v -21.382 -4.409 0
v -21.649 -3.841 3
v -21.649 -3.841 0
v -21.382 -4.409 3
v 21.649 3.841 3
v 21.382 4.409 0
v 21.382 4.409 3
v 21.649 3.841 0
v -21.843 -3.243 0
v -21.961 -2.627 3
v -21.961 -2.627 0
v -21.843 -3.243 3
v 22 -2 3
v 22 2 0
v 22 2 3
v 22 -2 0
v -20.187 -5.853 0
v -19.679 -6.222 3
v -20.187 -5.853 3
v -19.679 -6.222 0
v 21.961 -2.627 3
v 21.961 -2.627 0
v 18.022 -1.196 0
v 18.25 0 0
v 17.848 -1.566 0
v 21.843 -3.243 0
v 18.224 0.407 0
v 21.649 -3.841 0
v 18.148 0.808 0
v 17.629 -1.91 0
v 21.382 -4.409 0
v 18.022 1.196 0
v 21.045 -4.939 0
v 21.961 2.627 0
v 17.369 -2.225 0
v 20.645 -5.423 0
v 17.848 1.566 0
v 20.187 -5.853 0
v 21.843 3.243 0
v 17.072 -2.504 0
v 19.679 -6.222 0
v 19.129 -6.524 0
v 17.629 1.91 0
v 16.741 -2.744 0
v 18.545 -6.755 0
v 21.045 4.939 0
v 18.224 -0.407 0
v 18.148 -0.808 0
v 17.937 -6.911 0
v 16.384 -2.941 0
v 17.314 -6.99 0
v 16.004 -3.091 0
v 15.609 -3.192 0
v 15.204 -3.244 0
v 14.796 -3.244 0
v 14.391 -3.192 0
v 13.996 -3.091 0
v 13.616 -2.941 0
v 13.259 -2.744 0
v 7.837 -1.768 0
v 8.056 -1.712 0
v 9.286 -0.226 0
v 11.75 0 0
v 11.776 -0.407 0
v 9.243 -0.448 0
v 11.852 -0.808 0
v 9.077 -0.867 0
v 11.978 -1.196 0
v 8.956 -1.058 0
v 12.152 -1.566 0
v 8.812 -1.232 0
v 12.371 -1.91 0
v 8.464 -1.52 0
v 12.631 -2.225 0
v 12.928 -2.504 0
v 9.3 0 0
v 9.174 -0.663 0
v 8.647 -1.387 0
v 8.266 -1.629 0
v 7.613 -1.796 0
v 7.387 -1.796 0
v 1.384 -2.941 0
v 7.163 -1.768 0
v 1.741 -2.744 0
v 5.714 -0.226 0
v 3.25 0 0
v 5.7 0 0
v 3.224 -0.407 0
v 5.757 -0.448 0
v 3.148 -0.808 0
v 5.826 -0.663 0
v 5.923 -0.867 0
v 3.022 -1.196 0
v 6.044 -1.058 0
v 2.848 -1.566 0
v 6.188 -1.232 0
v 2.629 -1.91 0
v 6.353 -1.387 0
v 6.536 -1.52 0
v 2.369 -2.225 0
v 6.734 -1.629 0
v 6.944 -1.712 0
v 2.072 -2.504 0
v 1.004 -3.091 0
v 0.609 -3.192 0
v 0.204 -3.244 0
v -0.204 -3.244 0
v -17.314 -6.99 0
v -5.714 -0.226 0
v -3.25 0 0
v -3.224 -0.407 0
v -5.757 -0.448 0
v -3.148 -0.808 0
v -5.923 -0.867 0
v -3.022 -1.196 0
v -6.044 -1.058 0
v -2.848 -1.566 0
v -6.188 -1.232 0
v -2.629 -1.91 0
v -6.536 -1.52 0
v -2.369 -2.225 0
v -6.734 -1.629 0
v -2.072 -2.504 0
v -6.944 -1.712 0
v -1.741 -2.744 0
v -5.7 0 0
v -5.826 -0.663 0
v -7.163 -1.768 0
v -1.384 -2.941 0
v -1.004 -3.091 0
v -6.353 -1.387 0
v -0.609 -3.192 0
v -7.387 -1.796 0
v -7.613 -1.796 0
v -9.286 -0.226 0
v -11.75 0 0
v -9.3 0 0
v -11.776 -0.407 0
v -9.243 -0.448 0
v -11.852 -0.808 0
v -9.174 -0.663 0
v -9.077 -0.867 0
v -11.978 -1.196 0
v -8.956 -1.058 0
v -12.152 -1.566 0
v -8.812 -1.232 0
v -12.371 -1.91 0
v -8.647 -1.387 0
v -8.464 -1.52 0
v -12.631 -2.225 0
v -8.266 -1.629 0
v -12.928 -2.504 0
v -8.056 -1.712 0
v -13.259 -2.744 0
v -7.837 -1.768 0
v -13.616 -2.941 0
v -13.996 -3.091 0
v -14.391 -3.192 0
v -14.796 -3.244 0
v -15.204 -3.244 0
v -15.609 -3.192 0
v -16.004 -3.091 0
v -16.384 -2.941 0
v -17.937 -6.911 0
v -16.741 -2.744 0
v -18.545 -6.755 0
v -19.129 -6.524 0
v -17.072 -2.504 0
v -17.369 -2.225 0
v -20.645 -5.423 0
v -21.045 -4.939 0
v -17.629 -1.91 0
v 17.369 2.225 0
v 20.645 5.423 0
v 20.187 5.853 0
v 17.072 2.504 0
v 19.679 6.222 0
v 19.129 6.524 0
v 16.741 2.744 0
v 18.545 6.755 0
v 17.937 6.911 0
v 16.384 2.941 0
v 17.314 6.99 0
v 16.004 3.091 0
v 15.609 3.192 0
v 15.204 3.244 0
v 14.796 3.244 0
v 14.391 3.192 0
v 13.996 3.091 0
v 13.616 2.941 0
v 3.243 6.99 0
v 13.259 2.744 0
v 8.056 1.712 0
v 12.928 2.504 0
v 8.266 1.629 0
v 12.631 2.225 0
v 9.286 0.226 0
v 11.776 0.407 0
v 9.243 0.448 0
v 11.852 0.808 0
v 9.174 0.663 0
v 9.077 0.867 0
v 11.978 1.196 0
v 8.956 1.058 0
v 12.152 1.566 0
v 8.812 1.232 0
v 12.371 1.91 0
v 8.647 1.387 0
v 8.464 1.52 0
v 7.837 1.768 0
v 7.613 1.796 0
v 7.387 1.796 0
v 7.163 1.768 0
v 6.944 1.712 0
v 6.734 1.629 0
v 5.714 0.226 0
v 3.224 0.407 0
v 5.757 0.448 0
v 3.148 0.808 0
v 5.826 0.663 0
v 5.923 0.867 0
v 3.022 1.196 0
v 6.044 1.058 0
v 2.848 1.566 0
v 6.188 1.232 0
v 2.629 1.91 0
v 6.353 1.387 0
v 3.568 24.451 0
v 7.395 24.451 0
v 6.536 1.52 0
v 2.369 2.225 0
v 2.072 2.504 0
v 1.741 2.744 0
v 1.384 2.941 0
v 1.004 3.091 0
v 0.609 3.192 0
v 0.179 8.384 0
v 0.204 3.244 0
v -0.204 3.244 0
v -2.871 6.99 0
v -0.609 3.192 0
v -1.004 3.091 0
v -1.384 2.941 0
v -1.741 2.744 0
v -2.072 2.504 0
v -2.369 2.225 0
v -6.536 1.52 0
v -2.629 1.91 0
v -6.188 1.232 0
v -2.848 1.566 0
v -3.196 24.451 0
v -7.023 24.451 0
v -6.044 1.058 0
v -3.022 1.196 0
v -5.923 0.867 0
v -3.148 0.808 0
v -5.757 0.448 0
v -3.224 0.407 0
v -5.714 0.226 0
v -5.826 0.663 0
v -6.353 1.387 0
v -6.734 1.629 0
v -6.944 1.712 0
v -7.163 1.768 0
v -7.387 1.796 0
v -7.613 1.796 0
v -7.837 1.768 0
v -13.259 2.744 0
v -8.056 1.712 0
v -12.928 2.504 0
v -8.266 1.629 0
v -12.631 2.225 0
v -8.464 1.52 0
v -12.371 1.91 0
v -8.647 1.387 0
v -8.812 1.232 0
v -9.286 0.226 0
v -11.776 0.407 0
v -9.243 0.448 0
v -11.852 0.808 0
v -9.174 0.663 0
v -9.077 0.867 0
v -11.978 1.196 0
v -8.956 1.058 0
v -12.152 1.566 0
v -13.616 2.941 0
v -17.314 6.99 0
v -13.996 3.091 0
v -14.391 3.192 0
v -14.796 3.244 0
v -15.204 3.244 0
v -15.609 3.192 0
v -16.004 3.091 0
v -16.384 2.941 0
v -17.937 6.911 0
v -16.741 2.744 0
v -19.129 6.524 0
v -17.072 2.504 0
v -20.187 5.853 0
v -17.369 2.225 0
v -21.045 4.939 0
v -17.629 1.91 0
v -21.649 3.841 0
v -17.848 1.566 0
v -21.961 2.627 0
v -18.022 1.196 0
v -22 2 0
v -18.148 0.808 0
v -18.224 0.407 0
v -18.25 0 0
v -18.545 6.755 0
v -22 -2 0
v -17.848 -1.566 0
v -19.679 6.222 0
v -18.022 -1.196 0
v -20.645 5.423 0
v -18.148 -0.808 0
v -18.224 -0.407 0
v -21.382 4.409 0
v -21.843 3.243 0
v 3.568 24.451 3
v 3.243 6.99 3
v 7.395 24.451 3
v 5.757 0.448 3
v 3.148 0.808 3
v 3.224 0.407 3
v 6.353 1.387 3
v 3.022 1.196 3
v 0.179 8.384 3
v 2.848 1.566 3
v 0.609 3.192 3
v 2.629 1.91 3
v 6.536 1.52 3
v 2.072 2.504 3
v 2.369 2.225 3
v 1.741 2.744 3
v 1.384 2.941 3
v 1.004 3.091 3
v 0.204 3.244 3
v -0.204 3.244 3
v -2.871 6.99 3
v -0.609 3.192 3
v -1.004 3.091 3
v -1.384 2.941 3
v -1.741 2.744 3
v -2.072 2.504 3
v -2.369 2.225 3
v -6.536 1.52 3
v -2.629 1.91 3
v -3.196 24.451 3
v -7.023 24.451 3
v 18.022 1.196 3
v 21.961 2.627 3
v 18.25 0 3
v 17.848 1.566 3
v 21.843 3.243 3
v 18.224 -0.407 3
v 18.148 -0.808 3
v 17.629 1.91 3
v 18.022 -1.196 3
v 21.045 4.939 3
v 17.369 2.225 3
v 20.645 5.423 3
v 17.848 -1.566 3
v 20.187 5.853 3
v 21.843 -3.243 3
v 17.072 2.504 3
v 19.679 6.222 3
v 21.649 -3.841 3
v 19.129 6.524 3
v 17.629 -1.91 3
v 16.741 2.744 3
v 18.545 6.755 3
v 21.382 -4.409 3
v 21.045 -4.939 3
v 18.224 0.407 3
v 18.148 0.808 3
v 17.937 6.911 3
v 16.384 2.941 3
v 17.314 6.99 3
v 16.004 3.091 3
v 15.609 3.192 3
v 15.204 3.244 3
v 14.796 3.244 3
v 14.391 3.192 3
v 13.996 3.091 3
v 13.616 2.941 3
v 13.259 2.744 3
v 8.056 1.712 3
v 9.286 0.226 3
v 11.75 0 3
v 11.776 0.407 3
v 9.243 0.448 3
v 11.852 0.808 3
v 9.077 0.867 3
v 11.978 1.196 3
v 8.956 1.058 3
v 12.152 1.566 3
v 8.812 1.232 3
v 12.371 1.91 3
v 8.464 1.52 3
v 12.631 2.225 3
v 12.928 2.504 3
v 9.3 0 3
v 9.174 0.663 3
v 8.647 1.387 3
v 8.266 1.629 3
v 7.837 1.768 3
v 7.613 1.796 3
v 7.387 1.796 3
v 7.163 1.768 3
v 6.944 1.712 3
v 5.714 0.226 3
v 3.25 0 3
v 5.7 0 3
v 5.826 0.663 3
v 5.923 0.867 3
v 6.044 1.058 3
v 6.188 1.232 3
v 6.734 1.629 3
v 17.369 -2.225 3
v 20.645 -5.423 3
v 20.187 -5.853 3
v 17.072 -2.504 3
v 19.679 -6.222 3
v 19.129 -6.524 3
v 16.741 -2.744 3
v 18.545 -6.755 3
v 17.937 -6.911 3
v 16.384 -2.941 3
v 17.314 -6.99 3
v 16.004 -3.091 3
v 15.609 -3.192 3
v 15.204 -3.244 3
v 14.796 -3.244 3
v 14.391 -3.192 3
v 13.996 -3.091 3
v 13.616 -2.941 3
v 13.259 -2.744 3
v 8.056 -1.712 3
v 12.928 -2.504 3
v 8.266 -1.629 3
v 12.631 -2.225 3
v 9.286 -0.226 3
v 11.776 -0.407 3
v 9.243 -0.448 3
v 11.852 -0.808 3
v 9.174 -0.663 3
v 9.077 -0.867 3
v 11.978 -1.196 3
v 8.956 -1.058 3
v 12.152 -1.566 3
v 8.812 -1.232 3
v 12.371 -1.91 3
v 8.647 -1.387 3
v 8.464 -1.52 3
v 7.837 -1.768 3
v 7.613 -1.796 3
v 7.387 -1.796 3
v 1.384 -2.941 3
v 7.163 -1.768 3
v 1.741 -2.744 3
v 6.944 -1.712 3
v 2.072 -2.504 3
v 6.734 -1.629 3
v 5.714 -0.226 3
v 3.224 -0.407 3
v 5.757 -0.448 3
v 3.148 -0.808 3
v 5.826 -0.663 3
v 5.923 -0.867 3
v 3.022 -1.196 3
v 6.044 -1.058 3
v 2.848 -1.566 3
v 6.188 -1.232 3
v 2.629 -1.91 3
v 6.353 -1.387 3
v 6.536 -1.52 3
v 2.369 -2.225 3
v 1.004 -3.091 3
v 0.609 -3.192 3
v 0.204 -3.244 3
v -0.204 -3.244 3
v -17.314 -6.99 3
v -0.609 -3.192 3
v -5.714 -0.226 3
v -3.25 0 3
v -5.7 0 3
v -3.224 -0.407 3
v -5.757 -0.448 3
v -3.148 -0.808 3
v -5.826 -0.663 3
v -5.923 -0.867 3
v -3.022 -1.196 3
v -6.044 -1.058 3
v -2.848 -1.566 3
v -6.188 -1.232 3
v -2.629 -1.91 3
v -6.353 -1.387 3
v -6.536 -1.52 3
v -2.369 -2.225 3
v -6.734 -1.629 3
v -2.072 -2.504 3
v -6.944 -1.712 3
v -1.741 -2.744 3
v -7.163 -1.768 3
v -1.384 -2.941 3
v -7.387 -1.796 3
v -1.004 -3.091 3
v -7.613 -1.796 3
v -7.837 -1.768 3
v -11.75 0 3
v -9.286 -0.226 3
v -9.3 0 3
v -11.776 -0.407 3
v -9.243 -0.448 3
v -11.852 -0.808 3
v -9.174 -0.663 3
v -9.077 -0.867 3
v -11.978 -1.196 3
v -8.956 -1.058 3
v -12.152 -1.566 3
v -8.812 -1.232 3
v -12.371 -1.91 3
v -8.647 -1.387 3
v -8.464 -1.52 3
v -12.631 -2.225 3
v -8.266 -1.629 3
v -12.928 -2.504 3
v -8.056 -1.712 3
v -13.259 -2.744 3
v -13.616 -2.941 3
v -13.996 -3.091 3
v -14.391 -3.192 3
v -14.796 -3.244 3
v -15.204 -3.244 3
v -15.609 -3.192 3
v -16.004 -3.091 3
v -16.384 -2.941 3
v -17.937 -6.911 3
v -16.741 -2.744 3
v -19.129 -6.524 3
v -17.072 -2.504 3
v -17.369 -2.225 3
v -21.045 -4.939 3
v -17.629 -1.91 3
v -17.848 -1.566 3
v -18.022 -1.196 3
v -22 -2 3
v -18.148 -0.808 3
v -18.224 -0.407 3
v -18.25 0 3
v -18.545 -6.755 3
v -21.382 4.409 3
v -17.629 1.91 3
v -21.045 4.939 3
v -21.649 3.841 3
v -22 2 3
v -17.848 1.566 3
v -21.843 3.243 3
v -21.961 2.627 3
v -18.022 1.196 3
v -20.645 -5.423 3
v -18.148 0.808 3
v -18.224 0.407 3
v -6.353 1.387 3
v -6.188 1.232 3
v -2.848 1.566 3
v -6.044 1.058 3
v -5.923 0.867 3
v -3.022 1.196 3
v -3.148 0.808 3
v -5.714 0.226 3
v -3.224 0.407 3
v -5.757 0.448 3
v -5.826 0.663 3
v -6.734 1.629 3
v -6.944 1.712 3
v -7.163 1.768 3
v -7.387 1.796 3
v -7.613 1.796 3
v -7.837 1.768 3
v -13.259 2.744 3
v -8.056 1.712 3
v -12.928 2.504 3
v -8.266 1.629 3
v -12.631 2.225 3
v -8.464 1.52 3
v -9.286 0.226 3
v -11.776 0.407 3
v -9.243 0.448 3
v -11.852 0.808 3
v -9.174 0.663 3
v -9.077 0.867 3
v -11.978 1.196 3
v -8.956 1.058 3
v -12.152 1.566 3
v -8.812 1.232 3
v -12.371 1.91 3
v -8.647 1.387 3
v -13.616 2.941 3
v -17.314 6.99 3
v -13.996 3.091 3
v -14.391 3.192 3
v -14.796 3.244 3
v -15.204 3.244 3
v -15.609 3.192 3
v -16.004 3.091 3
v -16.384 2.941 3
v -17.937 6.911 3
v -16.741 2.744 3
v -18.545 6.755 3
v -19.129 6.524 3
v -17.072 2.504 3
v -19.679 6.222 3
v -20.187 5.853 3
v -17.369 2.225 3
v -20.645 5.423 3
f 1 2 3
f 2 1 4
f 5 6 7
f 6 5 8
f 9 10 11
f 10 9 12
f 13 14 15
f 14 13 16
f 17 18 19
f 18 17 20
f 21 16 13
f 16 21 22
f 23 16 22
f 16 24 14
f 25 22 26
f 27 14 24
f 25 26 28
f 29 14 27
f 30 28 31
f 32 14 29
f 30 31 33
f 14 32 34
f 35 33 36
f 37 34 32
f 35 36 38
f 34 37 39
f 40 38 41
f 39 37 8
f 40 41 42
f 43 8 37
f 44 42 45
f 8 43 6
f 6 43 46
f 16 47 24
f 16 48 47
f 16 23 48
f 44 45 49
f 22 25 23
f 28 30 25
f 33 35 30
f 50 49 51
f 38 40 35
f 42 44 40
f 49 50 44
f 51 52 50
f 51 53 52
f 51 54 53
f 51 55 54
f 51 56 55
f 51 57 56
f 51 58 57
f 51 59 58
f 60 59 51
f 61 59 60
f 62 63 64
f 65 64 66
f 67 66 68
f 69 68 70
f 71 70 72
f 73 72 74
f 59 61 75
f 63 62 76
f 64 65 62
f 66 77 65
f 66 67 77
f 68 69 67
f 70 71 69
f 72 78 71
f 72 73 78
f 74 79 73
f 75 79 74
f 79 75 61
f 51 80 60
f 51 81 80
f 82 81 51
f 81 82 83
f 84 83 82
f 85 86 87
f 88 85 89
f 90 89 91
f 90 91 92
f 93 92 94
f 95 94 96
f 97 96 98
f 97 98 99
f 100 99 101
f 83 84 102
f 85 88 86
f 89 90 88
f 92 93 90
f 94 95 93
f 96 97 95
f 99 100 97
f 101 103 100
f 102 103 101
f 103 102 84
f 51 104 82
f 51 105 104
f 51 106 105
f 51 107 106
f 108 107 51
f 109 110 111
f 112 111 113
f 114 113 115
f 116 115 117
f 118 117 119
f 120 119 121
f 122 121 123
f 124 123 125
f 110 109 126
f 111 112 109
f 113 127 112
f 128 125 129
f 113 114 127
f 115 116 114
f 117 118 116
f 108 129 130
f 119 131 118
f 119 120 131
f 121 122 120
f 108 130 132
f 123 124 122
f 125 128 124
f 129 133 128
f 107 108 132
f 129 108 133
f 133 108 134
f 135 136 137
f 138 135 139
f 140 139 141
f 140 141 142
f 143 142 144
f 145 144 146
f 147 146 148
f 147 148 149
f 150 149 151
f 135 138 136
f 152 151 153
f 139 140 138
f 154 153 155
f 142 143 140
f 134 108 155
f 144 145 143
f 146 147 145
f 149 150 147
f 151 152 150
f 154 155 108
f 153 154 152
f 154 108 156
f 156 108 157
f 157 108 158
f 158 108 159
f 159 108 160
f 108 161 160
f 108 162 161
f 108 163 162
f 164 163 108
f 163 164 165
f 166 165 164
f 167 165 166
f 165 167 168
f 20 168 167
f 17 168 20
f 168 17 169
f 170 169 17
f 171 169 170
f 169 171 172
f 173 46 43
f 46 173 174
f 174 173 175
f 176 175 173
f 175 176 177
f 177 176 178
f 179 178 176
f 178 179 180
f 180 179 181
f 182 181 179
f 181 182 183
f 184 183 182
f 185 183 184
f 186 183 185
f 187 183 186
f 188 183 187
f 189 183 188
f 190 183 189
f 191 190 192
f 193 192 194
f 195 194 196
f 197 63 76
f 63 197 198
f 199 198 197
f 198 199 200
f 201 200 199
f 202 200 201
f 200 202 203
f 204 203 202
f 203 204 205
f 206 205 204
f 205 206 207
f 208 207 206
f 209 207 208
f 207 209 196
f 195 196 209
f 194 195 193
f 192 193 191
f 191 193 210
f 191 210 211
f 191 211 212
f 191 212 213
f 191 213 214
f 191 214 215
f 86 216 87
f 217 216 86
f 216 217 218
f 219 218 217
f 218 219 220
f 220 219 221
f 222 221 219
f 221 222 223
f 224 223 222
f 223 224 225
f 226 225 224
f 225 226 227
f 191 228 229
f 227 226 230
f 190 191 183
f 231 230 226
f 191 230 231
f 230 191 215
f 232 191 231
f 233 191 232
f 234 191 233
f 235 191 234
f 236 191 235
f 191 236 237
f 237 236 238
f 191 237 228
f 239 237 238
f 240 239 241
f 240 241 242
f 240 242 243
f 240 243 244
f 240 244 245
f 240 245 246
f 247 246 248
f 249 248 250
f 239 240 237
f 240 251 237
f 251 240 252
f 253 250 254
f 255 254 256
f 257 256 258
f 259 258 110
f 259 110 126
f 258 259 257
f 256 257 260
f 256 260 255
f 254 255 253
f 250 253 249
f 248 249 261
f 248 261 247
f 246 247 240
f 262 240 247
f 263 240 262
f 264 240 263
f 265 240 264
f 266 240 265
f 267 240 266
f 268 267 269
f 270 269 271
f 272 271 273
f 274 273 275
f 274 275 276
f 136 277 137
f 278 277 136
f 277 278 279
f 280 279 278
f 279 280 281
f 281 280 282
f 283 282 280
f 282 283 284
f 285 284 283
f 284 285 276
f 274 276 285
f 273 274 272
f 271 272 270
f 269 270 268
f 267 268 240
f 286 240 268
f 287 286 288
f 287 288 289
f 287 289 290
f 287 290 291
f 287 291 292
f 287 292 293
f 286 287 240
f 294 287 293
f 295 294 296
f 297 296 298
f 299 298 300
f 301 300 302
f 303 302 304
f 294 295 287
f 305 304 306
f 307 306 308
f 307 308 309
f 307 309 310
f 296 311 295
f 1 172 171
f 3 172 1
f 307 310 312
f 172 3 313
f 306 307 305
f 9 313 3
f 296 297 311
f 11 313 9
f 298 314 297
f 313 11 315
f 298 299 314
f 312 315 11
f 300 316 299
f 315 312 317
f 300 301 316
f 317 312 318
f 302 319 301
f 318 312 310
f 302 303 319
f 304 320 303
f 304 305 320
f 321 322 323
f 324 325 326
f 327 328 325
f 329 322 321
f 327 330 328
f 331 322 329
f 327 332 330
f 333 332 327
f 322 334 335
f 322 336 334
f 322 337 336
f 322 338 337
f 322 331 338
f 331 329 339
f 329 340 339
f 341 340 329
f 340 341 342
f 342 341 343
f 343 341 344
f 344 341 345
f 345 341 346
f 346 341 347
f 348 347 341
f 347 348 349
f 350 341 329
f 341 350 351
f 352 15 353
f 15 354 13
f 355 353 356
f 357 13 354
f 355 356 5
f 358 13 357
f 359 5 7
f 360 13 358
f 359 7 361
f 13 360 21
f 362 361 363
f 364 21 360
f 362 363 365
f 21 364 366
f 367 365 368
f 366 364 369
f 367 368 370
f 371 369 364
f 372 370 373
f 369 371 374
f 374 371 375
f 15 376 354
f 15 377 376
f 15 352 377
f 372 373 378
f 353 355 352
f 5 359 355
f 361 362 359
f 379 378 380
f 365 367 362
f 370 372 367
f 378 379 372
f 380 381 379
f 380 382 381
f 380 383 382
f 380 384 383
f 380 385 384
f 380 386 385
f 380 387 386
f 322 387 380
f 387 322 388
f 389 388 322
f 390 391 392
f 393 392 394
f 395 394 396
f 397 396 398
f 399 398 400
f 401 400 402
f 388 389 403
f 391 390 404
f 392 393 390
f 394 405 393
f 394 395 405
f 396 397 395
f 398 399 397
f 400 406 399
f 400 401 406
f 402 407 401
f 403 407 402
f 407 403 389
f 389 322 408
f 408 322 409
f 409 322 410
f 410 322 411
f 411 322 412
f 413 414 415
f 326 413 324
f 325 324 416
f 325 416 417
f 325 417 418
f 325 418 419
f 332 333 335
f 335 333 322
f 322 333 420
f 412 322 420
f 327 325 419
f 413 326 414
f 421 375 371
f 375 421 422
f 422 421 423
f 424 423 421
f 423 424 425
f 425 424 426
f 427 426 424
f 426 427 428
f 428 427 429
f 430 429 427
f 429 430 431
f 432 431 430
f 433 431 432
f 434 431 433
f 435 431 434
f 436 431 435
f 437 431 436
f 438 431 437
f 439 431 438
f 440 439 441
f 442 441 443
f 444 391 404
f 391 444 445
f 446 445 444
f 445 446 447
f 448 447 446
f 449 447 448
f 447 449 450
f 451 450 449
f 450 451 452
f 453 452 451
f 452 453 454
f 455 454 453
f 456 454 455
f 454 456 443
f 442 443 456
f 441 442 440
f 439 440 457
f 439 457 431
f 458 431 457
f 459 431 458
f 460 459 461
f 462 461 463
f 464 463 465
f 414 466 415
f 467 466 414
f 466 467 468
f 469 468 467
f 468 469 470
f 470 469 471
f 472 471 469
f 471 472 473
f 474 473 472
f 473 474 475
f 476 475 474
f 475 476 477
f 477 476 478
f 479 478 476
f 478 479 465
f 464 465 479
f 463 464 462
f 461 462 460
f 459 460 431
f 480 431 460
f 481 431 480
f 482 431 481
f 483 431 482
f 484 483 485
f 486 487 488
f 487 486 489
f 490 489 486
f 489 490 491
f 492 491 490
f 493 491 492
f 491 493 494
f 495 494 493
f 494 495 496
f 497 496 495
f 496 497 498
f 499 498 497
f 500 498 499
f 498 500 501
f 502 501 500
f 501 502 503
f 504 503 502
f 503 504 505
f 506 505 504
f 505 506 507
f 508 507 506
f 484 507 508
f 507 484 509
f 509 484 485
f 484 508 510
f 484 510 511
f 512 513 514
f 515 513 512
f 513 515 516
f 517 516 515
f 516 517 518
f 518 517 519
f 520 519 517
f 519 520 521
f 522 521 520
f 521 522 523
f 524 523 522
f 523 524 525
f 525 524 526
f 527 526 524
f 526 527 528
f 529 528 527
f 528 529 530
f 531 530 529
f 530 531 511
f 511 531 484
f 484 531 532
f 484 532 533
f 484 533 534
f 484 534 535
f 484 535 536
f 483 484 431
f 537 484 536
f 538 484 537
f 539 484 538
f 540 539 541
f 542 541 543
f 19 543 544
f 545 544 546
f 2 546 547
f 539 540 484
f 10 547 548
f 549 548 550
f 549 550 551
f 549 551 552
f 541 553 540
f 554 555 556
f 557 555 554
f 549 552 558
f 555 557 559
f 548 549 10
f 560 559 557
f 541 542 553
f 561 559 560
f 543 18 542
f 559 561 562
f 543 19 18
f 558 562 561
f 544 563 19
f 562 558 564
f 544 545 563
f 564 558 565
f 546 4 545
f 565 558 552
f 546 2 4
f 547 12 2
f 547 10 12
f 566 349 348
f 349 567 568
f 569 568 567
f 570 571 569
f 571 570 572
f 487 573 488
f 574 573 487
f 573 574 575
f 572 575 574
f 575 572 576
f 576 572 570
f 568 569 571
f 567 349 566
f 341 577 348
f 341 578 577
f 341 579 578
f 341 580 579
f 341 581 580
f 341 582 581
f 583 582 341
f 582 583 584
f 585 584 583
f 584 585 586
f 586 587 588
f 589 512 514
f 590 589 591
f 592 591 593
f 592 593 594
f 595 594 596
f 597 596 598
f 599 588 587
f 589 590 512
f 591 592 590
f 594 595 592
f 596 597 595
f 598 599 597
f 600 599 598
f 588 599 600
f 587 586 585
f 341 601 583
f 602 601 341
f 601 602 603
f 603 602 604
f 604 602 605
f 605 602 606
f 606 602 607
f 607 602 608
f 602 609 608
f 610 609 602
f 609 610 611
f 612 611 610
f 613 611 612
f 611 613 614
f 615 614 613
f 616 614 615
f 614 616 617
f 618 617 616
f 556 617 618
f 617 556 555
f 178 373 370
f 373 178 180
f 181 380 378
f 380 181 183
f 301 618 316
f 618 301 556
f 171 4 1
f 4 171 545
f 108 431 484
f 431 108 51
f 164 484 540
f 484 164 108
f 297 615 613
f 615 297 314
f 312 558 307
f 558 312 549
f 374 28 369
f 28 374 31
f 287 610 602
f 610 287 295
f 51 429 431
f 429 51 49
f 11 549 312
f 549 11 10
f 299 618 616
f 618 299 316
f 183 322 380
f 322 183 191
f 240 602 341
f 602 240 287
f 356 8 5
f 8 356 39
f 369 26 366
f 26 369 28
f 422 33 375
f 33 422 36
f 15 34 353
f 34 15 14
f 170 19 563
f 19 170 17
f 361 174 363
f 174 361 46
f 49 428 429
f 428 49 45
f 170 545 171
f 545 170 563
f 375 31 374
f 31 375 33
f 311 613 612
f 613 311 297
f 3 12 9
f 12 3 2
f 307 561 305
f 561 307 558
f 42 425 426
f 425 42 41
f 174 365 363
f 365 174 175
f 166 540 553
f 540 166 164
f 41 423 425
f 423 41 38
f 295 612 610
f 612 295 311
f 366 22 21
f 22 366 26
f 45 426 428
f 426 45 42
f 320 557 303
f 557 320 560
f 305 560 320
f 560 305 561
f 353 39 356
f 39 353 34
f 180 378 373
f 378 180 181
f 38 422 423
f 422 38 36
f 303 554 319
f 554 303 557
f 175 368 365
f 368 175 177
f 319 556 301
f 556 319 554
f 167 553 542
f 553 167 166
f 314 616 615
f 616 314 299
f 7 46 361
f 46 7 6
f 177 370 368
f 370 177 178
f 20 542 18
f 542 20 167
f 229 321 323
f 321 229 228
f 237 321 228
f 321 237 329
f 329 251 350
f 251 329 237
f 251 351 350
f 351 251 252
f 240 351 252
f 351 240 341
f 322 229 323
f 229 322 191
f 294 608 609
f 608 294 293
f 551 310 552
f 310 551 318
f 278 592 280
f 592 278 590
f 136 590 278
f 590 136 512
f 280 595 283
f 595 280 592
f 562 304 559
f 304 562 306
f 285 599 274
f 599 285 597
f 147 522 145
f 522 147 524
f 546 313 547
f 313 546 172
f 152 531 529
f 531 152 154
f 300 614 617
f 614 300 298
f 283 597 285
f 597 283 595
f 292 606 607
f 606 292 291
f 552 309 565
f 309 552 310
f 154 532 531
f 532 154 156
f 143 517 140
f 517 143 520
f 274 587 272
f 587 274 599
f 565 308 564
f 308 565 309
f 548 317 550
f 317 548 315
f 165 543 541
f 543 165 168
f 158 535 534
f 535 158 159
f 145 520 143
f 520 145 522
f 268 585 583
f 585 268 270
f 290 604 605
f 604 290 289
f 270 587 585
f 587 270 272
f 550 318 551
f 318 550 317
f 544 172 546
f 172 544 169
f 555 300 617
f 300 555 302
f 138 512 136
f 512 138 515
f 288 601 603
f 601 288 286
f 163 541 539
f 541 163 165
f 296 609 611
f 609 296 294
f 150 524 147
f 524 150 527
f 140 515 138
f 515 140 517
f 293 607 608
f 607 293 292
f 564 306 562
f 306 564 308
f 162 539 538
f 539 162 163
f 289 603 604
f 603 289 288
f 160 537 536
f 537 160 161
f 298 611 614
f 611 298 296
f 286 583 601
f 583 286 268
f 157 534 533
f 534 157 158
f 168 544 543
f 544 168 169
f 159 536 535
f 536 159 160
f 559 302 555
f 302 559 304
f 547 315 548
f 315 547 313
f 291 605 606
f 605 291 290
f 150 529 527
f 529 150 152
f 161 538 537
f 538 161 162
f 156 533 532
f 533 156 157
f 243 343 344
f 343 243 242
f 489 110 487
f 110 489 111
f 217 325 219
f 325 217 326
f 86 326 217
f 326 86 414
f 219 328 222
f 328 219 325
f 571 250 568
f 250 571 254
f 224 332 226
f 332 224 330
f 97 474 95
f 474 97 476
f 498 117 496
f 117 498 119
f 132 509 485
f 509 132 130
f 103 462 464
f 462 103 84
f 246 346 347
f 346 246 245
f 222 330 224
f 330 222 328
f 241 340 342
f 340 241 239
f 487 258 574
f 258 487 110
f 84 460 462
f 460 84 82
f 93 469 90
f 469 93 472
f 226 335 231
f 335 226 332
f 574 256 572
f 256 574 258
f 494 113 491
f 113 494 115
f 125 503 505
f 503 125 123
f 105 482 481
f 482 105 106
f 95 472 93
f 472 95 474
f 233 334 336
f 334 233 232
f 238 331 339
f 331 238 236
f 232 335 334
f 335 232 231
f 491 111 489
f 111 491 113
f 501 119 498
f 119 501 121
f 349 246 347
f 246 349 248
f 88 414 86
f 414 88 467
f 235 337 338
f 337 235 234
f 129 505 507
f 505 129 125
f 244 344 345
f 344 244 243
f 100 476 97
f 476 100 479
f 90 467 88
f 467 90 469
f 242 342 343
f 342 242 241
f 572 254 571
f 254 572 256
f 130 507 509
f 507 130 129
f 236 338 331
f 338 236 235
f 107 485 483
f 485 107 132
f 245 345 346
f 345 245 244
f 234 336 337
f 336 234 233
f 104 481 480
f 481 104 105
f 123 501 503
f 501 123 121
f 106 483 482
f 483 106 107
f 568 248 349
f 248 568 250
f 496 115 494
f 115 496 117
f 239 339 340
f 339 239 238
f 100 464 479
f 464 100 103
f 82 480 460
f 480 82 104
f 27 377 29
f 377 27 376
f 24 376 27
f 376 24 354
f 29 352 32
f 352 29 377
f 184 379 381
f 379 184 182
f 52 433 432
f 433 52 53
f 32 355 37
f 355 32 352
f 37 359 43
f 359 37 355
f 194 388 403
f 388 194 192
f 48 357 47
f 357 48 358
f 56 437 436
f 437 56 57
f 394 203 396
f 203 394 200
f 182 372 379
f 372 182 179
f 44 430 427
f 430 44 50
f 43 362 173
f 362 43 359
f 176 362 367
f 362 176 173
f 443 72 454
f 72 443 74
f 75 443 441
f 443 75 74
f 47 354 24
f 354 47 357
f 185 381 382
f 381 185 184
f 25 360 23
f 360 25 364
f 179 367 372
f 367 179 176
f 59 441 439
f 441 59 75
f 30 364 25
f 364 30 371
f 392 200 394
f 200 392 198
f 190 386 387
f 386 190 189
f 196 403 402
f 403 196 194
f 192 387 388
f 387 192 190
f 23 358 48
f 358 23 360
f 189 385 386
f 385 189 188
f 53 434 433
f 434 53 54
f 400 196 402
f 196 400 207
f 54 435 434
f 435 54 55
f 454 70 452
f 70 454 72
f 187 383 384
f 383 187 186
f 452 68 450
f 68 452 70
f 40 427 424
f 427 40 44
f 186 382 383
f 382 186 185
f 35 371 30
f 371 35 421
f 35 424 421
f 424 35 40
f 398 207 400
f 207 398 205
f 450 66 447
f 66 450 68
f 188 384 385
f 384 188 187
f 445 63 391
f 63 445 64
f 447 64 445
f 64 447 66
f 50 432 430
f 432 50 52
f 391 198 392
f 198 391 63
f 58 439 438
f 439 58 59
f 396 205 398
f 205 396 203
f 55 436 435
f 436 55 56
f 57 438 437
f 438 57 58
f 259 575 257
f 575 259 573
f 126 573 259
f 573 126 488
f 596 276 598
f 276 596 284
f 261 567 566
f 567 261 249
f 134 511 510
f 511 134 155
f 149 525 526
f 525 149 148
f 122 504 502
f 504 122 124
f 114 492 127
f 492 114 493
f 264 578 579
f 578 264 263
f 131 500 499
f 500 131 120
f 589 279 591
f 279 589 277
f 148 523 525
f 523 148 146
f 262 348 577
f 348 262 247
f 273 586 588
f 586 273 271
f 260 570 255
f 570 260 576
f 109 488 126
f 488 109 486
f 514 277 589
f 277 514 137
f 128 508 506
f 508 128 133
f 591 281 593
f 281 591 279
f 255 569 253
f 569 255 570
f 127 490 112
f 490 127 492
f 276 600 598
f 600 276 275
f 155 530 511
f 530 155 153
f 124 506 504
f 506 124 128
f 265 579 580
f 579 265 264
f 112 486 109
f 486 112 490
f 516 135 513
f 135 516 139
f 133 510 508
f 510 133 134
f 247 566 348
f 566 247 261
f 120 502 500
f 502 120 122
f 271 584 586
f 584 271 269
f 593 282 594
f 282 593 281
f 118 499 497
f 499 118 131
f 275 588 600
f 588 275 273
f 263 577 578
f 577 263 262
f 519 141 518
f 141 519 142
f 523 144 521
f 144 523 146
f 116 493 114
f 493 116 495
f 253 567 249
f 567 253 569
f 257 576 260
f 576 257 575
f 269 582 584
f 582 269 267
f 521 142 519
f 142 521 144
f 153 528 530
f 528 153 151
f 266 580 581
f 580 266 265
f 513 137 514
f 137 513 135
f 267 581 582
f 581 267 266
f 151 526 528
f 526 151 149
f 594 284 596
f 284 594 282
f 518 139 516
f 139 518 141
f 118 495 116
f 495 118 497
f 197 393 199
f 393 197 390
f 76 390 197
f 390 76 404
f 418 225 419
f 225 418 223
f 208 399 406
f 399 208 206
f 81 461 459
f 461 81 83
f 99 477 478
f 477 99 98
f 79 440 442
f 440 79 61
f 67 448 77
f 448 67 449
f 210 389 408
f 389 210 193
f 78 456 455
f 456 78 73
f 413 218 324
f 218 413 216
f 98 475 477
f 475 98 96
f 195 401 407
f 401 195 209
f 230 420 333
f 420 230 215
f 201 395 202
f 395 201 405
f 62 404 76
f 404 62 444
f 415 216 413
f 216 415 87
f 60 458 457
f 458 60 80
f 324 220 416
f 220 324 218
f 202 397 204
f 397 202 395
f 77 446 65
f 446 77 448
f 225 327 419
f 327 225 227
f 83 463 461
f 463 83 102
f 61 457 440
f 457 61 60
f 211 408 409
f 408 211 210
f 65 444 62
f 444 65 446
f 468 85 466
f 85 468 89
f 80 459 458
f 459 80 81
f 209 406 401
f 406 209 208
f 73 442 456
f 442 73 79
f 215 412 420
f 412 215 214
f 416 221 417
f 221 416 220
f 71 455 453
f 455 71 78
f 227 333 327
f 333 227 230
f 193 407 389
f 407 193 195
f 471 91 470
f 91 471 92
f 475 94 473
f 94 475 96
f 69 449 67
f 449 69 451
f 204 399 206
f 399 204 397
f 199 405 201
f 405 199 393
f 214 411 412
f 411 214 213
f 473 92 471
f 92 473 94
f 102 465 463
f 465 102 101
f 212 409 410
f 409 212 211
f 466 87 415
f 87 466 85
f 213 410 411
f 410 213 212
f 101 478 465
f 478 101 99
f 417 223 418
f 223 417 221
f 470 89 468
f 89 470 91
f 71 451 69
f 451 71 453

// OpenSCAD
$fn = 50;


difference() {
	union() {
		hull() {
			translate(v = [-17.0000000000, 2.0000000000, 0]) {
				cylinder(h = 3, r = 5);
			}
			translate(v = [17.0000000000, 2.0000000000, 0]) {
				cylinder(h = 3, r = 5);
			}
			translate(v = [-17.0000000000, -2.0000000000, 0]) {
				cylinder(h = 3, r = 5);
			}
			translate(v = [17.0000000000, -2.0000000000, 0]) {
				cylinder(h = 3, r = 5);
			}
		}
		translate(v = [0, 24, 0]) {
			linear_extrude(height = 3) {
				text(font = "DejaVu Sans Mono:style=Bold", halign = "center", size = 19.0000000000, text = "V", valign = "top");
			}
		}
	}
	union() {
		translate(v = [-15.0000000000, 0.0000000000, 0]) {
			translate(v = [0, 0, -100]) {
				cylinder(h = 200, r = 3.2500000000);
			}
		}
		translate(v = [0, 0, -100]) {
			cylinder(h = 200, r = 3.2500000000);
		}
		translate(v = [15.0000000000, 0.0000000000, 0]) {
			translate(v = [0, 0, -100]) {
				cylinder(h = 200, r = 3.2500000000);
			}
		}
		translate(v = [-15.0000000000, 0.0000000000, 0]) {
			translate(v = [0, 0, -100]) {
				cylinder(h = 200, r = 1.8000000000);
			}
		}
		translate(v = [-7.5000000000, 0.0000000000, 0]) {
			translate(v = [0, 0, -100]) {
				cylinder(h = 200, r = 1.8000000000);
			}
		}
		translate(v = [0, 0, -100]) {
			cylinder(h = 200, r = 1.8000000000);
		}
		translate(v = [7.5000000000, 0.0000000000, 0]) {
			translate(v = [0, 0, -100]) {
				cylinder(h = 200, r = 1.8000000000);
			}
		}
		translate(v = [15.0000000000, 0.0000000000, 0]) {
			translate(v = [0, 0, -100]) {
				cylinder(h = 200, r = 1.8000000000);
			}
		}
	}
}
